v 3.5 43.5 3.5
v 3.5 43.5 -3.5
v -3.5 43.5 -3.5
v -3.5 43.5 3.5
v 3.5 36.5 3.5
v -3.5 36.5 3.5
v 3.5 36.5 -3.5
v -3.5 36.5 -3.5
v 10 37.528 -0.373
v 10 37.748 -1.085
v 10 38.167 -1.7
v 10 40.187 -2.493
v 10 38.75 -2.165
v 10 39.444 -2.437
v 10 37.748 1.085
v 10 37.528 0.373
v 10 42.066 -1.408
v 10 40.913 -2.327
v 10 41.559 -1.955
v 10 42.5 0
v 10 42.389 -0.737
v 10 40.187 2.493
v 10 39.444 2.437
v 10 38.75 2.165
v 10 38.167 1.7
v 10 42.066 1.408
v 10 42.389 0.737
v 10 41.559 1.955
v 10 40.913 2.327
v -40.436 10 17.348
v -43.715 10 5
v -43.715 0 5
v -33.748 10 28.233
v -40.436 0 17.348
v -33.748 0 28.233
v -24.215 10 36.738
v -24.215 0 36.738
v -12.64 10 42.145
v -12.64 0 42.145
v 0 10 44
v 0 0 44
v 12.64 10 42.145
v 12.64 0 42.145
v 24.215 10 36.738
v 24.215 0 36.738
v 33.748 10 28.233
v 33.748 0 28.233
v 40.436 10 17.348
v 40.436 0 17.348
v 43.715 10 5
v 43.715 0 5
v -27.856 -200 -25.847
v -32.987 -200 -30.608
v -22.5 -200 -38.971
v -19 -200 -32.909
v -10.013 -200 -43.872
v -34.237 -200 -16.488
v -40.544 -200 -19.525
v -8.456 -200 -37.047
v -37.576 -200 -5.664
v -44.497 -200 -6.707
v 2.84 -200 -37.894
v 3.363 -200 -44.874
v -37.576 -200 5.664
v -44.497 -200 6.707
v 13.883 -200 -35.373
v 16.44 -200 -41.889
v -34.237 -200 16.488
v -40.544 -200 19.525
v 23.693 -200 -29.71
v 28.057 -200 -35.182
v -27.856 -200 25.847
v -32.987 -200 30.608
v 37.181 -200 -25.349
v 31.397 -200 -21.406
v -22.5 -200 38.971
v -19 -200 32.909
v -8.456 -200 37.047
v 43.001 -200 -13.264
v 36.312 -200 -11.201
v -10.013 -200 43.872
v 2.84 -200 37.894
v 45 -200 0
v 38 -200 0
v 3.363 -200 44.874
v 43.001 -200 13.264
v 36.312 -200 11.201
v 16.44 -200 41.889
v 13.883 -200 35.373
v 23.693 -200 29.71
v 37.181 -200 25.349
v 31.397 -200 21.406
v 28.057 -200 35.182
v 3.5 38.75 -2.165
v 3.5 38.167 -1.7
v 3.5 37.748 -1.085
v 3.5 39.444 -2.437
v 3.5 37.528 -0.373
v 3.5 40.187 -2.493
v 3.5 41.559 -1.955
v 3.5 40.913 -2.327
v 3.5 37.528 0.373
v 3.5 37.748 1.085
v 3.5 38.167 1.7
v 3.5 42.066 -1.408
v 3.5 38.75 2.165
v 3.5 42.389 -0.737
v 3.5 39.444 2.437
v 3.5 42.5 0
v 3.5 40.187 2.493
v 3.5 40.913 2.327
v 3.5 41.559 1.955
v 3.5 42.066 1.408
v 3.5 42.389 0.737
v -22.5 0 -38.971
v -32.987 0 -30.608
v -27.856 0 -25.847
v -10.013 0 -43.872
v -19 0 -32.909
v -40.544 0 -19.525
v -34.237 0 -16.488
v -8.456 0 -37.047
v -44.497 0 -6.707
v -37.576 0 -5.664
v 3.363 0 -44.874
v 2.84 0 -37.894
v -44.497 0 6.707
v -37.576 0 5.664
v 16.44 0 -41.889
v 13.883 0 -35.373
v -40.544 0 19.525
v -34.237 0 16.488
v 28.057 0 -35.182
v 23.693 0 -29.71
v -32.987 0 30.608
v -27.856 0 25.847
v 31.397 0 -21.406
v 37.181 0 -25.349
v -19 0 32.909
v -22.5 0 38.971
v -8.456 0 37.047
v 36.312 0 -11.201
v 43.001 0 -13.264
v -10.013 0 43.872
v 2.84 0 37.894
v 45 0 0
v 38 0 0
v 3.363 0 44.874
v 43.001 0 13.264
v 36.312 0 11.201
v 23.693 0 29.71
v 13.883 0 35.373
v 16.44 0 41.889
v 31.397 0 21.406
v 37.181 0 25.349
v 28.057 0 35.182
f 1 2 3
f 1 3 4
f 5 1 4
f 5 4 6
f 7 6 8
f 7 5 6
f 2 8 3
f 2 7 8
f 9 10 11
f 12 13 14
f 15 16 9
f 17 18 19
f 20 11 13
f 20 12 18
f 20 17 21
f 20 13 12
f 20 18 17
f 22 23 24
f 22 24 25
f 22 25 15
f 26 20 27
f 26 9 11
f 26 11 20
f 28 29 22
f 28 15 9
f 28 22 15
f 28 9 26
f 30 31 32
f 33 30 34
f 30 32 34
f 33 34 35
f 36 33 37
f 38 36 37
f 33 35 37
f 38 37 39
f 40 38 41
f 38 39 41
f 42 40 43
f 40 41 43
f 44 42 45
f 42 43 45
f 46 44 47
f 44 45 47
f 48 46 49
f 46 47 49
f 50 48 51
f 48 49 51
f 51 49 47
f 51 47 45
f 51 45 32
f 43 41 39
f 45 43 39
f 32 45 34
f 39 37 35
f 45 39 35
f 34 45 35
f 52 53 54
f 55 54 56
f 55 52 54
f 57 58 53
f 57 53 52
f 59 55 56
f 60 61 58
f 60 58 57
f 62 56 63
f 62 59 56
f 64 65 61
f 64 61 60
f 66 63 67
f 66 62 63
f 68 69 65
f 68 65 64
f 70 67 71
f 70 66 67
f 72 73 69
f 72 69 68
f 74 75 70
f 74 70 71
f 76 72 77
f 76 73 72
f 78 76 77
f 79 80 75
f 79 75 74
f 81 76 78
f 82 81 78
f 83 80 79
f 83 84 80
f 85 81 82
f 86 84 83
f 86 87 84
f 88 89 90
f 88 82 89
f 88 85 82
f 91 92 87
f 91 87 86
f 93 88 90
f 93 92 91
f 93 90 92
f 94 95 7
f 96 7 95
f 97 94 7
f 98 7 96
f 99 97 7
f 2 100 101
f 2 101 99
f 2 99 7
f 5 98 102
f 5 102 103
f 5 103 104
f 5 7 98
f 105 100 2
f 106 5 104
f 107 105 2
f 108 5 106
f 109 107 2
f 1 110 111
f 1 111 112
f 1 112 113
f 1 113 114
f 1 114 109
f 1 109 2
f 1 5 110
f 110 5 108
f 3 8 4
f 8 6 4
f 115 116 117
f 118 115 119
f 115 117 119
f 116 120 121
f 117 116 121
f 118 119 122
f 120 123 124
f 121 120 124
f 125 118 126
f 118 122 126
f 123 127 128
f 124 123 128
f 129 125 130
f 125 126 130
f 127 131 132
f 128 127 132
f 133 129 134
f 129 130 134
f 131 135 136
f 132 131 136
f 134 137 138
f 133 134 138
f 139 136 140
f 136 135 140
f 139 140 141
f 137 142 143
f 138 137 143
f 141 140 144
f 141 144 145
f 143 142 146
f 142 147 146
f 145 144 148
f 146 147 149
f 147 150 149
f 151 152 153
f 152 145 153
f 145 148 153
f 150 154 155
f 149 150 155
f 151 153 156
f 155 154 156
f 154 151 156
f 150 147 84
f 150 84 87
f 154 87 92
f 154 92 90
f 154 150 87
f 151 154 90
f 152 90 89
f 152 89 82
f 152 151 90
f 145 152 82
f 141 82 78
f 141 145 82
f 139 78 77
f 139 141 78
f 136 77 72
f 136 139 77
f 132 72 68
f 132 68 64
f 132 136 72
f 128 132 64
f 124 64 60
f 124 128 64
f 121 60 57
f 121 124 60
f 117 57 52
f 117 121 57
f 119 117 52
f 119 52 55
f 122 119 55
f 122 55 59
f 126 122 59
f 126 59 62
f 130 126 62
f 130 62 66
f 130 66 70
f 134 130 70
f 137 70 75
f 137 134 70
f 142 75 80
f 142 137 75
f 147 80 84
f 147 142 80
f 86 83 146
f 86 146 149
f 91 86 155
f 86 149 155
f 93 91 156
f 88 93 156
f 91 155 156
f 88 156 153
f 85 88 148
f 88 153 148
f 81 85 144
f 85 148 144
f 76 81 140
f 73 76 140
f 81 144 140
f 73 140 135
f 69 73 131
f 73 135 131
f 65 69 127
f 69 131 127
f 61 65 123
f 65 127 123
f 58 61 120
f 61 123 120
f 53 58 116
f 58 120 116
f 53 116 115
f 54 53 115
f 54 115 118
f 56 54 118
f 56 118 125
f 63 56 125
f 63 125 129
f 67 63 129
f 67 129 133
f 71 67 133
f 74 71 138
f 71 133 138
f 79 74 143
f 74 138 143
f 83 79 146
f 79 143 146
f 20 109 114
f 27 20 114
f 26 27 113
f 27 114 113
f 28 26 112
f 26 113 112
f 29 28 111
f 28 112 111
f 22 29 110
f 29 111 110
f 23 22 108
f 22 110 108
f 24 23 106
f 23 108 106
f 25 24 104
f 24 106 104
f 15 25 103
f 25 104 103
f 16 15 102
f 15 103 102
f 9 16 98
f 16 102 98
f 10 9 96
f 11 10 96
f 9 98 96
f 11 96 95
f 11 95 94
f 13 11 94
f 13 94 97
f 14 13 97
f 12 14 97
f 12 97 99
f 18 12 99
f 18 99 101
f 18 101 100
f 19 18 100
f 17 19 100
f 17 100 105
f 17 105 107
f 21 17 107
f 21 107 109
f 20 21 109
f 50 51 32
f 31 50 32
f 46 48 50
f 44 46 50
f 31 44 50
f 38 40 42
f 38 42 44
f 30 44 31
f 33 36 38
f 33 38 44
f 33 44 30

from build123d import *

# Parameters (mm, degrees)
F0_R     = 45
F0_R_2   = 38
F1_DEPTH = 200
F3_DEPTH = 10
F5_DEPTH = 10
F7_DEPTH = 3.5


with BuildPart() as f1:
    # F0 (on Front) → F1 (new body)
    with BuildSketch(Plane.XZ):
        Circle(F0_R)
        Circle(F0_R_2, mode=Mode.SUBTRACT)
    extrude(amount=F1_DEPTH)


with BuildPart() as f3:
    # F2 (on Right) → F3 (new body)
    with BuildSketch(Plane.YZ):
        with BuildLine():
            ThreePointArc((37.5, 0), (40, -2.5), (42.5, 0))
            ThreePointArc((42.5, 0), (40, 2.5), (37.5, 0))
        make_face()
    extrude(amount=F3_DEPTH)

    # F6 (on Right) → F7 (join, symmetric)
    with BuildSketch(Plane.YZ):
        Polygon((36.5, 0), (36.5, -3.5), (43.5, -3.5), (43.5, 3.5), (36.5, 3.5), align=None)
    extrude(amount=F7_DEPTH, both=True)


with BuildPart() as f5:
    # F4 (on face) → F5 (new body)
    with BuildSketch(Plane(origin=(0, 0, 0), x_dir=(-1, 0, 0), z_dir=(0, 1, 0))):
        with BuildLine():
            ThreePointArc((-37.669616, 5), (0, 38), (37.669616, 5))
            Line((37.669616, 5), (43.714986, 5))
            ThreePointArc((43.714986, 5), (0, 44), (-43.714986, 5))
            Line((-43.714986, 5), (-37.669616, 5))
        make_face()
        with BuildLine():
            Line((-37.669616, 5), (0, 5))
            Line((0, 5), (37.669616, 5))
            ThreePointArc((37.669616, 5), (0, 38), (-37.669616, 5))
        make_face()
    extrude(amount=F5_DEPTH)


solid = Compound([f1.part, f3.part, f5.part])
